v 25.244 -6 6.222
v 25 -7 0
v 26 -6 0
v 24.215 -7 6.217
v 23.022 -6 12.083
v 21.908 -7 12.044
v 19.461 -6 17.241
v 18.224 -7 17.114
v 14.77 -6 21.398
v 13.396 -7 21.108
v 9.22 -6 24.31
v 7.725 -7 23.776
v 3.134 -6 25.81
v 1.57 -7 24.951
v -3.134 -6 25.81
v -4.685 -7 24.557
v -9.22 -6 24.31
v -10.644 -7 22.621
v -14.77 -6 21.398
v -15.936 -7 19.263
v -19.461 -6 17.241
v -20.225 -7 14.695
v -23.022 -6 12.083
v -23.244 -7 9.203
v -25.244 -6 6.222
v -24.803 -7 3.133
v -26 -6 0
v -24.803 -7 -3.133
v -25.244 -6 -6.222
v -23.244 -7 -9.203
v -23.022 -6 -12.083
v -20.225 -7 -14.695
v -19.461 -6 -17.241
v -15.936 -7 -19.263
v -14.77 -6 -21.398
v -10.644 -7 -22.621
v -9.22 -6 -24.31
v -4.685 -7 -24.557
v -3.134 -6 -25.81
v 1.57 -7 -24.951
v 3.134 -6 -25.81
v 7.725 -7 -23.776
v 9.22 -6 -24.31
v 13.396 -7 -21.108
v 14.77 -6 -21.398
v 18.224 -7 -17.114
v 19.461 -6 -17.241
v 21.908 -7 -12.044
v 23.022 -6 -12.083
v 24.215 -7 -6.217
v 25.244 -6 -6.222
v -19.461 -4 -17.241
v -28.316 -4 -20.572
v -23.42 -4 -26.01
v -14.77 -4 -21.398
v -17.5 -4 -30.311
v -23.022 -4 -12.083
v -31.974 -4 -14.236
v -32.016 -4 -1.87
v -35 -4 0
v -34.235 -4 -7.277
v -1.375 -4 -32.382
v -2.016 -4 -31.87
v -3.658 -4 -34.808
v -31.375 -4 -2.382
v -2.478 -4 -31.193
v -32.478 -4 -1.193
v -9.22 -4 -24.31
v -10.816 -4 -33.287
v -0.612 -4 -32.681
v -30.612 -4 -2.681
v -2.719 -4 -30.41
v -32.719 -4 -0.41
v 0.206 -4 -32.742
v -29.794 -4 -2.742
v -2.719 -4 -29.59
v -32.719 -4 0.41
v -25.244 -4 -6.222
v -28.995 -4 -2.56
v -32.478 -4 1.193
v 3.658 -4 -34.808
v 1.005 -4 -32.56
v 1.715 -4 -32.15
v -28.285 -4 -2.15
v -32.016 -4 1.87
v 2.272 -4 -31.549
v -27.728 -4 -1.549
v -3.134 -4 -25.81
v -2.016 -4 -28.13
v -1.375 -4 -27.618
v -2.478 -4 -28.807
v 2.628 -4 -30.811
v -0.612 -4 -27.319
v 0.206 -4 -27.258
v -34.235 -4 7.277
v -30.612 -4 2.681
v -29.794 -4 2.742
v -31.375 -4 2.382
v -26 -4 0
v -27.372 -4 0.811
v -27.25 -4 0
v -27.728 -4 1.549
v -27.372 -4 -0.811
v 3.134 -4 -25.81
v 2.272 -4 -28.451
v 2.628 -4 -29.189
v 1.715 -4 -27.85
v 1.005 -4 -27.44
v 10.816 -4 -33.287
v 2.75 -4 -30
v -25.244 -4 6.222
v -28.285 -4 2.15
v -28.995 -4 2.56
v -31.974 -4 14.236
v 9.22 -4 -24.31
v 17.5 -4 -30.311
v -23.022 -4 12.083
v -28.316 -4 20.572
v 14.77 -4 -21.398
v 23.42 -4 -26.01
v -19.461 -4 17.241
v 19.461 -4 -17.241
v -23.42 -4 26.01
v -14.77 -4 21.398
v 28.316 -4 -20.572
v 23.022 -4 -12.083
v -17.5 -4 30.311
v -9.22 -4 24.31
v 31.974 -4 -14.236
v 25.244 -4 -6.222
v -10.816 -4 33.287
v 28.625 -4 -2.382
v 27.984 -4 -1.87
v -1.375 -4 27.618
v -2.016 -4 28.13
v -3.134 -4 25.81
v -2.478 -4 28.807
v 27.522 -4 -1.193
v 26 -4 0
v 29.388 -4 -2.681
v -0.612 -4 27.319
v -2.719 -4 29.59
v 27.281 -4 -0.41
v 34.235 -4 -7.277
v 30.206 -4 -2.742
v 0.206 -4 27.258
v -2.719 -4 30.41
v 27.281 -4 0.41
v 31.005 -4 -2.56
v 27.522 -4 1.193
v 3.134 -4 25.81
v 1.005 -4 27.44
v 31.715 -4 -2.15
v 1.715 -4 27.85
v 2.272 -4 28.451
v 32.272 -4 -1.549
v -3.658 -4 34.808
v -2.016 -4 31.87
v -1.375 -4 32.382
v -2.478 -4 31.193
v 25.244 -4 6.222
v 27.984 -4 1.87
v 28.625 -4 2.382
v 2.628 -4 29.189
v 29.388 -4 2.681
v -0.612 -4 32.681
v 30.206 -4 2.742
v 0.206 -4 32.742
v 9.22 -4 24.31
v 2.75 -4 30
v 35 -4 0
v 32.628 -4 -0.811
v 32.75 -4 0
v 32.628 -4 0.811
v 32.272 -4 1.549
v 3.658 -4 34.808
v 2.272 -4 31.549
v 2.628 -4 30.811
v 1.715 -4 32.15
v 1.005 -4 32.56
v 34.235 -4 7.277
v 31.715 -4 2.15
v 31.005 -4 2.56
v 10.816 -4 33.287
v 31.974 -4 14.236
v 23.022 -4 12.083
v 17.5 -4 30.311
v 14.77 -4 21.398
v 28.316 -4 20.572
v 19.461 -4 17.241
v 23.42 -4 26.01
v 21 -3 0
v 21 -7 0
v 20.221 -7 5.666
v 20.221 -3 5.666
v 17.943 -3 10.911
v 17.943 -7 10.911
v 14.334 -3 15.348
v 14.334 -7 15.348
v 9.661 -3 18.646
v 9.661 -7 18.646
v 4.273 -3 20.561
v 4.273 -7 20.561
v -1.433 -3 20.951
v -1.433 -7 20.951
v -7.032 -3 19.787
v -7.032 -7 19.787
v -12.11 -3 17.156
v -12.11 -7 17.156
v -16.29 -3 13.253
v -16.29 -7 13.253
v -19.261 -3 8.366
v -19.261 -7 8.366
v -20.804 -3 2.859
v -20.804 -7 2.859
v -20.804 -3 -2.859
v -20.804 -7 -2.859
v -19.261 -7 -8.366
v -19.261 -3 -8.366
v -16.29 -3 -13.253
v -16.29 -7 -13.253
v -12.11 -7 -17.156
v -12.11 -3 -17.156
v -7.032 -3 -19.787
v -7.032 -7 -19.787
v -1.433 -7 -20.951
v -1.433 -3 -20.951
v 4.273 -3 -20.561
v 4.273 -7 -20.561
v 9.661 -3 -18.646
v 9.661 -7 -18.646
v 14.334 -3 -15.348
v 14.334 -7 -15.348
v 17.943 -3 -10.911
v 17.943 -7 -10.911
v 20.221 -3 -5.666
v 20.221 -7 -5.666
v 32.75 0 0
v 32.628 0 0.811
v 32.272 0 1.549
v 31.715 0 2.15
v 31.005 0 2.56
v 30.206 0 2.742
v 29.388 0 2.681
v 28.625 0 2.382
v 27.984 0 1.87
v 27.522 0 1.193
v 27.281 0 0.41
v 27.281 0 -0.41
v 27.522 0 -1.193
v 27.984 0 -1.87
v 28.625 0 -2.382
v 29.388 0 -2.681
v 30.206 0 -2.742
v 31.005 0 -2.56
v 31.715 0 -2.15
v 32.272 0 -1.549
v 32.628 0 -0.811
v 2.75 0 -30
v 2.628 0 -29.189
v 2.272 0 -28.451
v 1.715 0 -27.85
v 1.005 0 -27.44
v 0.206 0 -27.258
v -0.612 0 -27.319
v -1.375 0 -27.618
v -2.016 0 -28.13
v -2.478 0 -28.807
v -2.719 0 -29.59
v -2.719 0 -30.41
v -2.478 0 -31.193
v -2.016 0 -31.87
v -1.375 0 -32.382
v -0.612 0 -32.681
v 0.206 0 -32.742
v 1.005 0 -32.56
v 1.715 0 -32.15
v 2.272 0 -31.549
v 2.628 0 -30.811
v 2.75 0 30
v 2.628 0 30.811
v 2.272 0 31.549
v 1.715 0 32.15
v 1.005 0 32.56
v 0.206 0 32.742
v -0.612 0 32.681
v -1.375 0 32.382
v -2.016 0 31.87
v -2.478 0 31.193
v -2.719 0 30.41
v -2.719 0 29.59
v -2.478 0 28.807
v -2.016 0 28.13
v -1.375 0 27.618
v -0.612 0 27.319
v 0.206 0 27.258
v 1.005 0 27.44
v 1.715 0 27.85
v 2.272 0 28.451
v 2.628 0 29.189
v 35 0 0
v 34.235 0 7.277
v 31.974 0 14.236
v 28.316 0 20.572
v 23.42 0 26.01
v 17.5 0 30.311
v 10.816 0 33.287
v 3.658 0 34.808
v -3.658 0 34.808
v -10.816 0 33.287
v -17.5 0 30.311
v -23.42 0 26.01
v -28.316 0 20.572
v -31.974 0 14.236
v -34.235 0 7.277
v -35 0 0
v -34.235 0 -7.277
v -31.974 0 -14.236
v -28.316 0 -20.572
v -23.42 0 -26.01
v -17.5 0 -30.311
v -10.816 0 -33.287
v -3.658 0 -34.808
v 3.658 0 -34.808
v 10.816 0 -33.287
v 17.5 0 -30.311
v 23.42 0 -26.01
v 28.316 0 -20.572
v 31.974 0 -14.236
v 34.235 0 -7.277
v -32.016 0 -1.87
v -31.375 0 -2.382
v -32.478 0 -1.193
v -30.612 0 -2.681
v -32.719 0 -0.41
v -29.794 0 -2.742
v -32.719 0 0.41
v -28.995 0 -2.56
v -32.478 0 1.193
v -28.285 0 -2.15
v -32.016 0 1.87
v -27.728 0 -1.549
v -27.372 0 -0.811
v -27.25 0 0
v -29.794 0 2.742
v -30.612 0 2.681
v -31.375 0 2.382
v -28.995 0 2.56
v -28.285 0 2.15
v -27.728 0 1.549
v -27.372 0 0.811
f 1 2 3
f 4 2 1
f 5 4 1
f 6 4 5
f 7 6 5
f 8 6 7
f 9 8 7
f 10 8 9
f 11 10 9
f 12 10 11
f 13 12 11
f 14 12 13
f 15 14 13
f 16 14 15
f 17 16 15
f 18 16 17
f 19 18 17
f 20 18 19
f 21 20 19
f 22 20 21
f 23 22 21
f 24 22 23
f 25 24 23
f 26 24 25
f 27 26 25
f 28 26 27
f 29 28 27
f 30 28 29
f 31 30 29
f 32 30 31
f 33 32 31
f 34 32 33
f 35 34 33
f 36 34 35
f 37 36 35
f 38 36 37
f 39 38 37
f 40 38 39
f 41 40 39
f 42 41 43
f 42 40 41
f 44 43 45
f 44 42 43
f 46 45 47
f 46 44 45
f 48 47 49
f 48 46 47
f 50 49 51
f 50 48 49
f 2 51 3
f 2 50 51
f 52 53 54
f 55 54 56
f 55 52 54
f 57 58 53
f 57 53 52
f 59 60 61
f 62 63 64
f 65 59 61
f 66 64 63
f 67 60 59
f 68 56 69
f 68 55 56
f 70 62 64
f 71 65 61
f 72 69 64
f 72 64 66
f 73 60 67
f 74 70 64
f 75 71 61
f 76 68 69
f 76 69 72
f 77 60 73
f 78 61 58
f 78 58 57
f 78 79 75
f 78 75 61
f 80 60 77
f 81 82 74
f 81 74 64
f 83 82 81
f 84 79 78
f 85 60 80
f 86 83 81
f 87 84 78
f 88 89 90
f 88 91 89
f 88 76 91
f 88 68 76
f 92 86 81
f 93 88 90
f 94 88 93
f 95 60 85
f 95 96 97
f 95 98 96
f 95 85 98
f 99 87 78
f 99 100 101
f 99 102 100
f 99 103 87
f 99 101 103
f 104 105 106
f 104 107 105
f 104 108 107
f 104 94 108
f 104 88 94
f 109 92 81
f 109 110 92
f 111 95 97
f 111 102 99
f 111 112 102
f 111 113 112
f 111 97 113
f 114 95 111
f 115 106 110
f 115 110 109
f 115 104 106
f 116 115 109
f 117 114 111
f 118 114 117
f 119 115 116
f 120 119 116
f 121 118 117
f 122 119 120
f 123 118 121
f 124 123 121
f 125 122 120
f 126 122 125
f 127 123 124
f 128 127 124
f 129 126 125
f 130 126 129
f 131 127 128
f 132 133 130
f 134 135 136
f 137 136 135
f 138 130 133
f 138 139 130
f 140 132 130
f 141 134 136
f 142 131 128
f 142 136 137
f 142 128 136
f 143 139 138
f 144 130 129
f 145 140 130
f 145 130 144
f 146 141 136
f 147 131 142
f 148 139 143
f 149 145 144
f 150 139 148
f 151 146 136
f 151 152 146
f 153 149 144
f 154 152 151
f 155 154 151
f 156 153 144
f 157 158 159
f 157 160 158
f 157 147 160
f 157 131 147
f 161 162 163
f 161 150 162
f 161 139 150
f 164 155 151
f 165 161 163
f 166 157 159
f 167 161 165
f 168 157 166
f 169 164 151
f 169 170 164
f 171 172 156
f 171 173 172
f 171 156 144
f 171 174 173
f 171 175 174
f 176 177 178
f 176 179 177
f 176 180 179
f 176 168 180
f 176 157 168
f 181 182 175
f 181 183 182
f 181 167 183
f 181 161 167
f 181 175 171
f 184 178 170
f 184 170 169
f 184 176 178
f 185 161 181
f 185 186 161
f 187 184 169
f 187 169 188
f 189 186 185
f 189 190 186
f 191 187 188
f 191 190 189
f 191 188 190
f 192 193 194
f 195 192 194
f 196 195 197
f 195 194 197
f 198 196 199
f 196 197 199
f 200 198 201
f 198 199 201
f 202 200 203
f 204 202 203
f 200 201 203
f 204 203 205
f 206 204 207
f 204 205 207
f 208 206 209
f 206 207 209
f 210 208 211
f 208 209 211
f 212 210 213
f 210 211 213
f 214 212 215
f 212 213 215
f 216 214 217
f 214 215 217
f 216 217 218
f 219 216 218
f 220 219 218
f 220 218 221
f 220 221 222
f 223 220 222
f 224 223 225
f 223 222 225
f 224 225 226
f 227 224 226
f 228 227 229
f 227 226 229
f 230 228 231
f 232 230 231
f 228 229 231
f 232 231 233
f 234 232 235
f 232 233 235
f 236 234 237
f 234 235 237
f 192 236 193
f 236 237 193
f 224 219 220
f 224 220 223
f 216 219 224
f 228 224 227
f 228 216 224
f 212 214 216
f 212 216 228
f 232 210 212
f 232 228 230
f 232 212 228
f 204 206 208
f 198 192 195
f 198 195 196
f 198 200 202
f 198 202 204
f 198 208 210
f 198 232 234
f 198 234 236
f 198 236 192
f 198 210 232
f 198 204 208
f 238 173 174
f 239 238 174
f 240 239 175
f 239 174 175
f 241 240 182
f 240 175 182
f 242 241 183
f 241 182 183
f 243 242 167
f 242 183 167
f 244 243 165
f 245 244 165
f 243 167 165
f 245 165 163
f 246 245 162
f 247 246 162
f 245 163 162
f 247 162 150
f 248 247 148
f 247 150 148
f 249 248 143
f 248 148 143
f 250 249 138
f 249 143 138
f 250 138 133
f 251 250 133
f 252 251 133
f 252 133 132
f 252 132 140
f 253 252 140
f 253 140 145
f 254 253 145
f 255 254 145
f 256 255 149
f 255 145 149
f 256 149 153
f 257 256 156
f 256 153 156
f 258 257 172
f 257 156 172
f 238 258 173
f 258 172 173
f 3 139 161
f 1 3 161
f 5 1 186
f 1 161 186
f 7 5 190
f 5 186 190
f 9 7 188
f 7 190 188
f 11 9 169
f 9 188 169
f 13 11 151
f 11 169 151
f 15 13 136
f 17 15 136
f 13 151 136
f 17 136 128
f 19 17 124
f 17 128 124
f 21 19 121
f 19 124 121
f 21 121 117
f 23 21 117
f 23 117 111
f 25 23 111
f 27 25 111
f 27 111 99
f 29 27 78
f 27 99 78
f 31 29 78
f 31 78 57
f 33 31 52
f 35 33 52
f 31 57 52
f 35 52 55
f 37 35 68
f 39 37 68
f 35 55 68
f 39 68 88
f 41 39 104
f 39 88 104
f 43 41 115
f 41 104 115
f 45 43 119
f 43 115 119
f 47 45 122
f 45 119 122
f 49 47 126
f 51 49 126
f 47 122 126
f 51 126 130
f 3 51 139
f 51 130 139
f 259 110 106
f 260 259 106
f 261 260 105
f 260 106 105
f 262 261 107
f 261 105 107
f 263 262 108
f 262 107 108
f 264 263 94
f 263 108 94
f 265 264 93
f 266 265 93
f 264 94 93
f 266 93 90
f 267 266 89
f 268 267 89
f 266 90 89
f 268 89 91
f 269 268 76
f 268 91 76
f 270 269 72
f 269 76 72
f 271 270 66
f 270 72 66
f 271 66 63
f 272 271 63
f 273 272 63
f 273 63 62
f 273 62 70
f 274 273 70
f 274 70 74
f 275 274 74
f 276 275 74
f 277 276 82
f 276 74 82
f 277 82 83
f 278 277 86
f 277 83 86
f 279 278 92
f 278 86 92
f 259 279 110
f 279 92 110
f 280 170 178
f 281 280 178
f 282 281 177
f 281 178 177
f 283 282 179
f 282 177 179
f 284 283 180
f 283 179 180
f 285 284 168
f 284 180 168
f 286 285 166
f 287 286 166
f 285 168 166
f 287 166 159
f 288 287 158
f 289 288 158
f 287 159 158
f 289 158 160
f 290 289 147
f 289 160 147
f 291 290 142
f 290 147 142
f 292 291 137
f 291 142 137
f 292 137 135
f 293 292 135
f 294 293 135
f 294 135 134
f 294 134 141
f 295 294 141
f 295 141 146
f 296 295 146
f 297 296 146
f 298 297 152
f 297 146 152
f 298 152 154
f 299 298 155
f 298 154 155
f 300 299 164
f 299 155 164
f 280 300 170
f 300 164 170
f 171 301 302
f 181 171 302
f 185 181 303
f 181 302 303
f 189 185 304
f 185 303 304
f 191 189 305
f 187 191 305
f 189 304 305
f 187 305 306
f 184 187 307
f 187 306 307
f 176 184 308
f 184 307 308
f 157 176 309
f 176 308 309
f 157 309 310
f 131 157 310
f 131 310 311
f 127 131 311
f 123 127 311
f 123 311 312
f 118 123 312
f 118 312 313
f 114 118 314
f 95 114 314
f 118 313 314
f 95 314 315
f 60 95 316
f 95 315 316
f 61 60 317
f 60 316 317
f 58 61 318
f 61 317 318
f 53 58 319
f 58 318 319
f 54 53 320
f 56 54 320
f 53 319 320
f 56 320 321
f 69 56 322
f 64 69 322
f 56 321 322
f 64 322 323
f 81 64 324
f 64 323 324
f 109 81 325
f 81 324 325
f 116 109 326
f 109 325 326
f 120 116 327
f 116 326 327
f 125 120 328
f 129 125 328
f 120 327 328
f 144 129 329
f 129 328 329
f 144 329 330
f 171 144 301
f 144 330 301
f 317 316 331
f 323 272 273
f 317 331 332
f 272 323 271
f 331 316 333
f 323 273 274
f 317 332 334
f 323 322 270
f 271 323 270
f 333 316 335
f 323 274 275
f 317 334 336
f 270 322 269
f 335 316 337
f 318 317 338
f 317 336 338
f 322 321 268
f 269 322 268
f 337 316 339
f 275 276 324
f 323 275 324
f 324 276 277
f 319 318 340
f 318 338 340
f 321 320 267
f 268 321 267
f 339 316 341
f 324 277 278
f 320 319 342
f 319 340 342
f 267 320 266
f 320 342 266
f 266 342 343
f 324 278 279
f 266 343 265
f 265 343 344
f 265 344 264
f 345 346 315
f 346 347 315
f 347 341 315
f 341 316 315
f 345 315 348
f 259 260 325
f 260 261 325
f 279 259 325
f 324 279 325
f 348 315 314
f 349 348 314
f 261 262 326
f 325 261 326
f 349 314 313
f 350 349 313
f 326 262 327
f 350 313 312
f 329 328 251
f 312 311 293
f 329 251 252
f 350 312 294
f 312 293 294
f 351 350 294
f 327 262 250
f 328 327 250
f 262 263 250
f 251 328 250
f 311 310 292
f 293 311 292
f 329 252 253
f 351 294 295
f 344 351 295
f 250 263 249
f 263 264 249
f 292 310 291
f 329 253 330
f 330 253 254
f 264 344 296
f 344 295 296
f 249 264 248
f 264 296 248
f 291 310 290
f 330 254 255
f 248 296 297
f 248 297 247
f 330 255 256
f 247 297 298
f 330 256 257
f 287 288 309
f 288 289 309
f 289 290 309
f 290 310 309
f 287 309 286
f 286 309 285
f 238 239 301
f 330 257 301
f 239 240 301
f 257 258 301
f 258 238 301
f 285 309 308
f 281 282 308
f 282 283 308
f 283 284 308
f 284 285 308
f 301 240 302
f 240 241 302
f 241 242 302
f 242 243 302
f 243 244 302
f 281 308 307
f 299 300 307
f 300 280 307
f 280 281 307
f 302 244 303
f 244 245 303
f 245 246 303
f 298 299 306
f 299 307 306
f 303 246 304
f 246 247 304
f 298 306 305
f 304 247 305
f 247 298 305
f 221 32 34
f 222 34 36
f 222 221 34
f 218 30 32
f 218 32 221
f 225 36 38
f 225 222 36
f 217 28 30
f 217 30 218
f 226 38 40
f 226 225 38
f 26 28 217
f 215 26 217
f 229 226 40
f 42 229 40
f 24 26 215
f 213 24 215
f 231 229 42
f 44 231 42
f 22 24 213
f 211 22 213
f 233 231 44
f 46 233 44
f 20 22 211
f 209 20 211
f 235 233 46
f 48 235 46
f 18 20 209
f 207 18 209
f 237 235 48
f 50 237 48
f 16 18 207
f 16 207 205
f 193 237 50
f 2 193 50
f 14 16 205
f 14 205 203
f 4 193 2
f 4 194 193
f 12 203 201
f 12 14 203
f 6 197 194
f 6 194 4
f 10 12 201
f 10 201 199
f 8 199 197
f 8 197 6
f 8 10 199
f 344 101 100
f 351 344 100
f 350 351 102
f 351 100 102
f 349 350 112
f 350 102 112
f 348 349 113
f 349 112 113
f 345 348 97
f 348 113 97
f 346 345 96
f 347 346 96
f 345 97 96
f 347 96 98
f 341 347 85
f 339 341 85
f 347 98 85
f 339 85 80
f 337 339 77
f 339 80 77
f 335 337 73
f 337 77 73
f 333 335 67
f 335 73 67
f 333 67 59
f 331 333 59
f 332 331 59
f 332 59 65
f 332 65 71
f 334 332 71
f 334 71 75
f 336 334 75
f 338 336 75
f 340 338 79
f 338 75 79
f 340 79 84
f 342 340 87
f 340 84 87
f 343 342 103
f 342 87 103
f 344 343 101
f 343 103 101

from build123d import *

# Parameters (mm, degrees)
F0_R     = 35
F1_DEPTH = 4
F2_R     = 2.75
F3_DEPTH = 4
F4_R     = 26
F5_DEPTH = 3
F6_R     = 21
F7_DEPTH = 4
F8_SIZE  = 1


with BuildPart() as f1:
    # F0 (on Front) → F1 (new body)
    with BuildSketch(Plane.XZ):
        Circle(F0_R)
    extrude(amount=F1_DEPTH)

    # F2 (on face) → F3 (cut, through all)
    with BuildSketch(Plane.XZ.offset(4)):
        with Locations((30, 0)):
            Circle(F2_R)
        with Locations((0, 30)):
            Circle(F2_R)
        with Locations((-30, 0)):
            Circle(F2_R)
        with Locations((0, -30)):
            Circle(F2_R)
    extrude(amount=-F3_DEPTH, mode=Mode.SUBTRACT)

    # F4 (on face) → F5 (join)
    with BuildSketch(Plane.XZ.offset(4)):
        Circle(F4_R)
    extrude(amount=F5_DEPTH)

    # F6 (on face) → F7 (cut)
    with BuildSketch(Plane.XZ.offset(7)):
        Circle(F6_R)
    extrude(amount=-F7_DEPTH, mode=Mode.SUBTRACT)

    # F8
    f8_edges = [f1.edges().sort_by_distance(p)[0] for p in [
        (-26, -7, 0),
    ]]
    chamfer(f8_edges, length=F8_SIZE)


solid = f1.part
